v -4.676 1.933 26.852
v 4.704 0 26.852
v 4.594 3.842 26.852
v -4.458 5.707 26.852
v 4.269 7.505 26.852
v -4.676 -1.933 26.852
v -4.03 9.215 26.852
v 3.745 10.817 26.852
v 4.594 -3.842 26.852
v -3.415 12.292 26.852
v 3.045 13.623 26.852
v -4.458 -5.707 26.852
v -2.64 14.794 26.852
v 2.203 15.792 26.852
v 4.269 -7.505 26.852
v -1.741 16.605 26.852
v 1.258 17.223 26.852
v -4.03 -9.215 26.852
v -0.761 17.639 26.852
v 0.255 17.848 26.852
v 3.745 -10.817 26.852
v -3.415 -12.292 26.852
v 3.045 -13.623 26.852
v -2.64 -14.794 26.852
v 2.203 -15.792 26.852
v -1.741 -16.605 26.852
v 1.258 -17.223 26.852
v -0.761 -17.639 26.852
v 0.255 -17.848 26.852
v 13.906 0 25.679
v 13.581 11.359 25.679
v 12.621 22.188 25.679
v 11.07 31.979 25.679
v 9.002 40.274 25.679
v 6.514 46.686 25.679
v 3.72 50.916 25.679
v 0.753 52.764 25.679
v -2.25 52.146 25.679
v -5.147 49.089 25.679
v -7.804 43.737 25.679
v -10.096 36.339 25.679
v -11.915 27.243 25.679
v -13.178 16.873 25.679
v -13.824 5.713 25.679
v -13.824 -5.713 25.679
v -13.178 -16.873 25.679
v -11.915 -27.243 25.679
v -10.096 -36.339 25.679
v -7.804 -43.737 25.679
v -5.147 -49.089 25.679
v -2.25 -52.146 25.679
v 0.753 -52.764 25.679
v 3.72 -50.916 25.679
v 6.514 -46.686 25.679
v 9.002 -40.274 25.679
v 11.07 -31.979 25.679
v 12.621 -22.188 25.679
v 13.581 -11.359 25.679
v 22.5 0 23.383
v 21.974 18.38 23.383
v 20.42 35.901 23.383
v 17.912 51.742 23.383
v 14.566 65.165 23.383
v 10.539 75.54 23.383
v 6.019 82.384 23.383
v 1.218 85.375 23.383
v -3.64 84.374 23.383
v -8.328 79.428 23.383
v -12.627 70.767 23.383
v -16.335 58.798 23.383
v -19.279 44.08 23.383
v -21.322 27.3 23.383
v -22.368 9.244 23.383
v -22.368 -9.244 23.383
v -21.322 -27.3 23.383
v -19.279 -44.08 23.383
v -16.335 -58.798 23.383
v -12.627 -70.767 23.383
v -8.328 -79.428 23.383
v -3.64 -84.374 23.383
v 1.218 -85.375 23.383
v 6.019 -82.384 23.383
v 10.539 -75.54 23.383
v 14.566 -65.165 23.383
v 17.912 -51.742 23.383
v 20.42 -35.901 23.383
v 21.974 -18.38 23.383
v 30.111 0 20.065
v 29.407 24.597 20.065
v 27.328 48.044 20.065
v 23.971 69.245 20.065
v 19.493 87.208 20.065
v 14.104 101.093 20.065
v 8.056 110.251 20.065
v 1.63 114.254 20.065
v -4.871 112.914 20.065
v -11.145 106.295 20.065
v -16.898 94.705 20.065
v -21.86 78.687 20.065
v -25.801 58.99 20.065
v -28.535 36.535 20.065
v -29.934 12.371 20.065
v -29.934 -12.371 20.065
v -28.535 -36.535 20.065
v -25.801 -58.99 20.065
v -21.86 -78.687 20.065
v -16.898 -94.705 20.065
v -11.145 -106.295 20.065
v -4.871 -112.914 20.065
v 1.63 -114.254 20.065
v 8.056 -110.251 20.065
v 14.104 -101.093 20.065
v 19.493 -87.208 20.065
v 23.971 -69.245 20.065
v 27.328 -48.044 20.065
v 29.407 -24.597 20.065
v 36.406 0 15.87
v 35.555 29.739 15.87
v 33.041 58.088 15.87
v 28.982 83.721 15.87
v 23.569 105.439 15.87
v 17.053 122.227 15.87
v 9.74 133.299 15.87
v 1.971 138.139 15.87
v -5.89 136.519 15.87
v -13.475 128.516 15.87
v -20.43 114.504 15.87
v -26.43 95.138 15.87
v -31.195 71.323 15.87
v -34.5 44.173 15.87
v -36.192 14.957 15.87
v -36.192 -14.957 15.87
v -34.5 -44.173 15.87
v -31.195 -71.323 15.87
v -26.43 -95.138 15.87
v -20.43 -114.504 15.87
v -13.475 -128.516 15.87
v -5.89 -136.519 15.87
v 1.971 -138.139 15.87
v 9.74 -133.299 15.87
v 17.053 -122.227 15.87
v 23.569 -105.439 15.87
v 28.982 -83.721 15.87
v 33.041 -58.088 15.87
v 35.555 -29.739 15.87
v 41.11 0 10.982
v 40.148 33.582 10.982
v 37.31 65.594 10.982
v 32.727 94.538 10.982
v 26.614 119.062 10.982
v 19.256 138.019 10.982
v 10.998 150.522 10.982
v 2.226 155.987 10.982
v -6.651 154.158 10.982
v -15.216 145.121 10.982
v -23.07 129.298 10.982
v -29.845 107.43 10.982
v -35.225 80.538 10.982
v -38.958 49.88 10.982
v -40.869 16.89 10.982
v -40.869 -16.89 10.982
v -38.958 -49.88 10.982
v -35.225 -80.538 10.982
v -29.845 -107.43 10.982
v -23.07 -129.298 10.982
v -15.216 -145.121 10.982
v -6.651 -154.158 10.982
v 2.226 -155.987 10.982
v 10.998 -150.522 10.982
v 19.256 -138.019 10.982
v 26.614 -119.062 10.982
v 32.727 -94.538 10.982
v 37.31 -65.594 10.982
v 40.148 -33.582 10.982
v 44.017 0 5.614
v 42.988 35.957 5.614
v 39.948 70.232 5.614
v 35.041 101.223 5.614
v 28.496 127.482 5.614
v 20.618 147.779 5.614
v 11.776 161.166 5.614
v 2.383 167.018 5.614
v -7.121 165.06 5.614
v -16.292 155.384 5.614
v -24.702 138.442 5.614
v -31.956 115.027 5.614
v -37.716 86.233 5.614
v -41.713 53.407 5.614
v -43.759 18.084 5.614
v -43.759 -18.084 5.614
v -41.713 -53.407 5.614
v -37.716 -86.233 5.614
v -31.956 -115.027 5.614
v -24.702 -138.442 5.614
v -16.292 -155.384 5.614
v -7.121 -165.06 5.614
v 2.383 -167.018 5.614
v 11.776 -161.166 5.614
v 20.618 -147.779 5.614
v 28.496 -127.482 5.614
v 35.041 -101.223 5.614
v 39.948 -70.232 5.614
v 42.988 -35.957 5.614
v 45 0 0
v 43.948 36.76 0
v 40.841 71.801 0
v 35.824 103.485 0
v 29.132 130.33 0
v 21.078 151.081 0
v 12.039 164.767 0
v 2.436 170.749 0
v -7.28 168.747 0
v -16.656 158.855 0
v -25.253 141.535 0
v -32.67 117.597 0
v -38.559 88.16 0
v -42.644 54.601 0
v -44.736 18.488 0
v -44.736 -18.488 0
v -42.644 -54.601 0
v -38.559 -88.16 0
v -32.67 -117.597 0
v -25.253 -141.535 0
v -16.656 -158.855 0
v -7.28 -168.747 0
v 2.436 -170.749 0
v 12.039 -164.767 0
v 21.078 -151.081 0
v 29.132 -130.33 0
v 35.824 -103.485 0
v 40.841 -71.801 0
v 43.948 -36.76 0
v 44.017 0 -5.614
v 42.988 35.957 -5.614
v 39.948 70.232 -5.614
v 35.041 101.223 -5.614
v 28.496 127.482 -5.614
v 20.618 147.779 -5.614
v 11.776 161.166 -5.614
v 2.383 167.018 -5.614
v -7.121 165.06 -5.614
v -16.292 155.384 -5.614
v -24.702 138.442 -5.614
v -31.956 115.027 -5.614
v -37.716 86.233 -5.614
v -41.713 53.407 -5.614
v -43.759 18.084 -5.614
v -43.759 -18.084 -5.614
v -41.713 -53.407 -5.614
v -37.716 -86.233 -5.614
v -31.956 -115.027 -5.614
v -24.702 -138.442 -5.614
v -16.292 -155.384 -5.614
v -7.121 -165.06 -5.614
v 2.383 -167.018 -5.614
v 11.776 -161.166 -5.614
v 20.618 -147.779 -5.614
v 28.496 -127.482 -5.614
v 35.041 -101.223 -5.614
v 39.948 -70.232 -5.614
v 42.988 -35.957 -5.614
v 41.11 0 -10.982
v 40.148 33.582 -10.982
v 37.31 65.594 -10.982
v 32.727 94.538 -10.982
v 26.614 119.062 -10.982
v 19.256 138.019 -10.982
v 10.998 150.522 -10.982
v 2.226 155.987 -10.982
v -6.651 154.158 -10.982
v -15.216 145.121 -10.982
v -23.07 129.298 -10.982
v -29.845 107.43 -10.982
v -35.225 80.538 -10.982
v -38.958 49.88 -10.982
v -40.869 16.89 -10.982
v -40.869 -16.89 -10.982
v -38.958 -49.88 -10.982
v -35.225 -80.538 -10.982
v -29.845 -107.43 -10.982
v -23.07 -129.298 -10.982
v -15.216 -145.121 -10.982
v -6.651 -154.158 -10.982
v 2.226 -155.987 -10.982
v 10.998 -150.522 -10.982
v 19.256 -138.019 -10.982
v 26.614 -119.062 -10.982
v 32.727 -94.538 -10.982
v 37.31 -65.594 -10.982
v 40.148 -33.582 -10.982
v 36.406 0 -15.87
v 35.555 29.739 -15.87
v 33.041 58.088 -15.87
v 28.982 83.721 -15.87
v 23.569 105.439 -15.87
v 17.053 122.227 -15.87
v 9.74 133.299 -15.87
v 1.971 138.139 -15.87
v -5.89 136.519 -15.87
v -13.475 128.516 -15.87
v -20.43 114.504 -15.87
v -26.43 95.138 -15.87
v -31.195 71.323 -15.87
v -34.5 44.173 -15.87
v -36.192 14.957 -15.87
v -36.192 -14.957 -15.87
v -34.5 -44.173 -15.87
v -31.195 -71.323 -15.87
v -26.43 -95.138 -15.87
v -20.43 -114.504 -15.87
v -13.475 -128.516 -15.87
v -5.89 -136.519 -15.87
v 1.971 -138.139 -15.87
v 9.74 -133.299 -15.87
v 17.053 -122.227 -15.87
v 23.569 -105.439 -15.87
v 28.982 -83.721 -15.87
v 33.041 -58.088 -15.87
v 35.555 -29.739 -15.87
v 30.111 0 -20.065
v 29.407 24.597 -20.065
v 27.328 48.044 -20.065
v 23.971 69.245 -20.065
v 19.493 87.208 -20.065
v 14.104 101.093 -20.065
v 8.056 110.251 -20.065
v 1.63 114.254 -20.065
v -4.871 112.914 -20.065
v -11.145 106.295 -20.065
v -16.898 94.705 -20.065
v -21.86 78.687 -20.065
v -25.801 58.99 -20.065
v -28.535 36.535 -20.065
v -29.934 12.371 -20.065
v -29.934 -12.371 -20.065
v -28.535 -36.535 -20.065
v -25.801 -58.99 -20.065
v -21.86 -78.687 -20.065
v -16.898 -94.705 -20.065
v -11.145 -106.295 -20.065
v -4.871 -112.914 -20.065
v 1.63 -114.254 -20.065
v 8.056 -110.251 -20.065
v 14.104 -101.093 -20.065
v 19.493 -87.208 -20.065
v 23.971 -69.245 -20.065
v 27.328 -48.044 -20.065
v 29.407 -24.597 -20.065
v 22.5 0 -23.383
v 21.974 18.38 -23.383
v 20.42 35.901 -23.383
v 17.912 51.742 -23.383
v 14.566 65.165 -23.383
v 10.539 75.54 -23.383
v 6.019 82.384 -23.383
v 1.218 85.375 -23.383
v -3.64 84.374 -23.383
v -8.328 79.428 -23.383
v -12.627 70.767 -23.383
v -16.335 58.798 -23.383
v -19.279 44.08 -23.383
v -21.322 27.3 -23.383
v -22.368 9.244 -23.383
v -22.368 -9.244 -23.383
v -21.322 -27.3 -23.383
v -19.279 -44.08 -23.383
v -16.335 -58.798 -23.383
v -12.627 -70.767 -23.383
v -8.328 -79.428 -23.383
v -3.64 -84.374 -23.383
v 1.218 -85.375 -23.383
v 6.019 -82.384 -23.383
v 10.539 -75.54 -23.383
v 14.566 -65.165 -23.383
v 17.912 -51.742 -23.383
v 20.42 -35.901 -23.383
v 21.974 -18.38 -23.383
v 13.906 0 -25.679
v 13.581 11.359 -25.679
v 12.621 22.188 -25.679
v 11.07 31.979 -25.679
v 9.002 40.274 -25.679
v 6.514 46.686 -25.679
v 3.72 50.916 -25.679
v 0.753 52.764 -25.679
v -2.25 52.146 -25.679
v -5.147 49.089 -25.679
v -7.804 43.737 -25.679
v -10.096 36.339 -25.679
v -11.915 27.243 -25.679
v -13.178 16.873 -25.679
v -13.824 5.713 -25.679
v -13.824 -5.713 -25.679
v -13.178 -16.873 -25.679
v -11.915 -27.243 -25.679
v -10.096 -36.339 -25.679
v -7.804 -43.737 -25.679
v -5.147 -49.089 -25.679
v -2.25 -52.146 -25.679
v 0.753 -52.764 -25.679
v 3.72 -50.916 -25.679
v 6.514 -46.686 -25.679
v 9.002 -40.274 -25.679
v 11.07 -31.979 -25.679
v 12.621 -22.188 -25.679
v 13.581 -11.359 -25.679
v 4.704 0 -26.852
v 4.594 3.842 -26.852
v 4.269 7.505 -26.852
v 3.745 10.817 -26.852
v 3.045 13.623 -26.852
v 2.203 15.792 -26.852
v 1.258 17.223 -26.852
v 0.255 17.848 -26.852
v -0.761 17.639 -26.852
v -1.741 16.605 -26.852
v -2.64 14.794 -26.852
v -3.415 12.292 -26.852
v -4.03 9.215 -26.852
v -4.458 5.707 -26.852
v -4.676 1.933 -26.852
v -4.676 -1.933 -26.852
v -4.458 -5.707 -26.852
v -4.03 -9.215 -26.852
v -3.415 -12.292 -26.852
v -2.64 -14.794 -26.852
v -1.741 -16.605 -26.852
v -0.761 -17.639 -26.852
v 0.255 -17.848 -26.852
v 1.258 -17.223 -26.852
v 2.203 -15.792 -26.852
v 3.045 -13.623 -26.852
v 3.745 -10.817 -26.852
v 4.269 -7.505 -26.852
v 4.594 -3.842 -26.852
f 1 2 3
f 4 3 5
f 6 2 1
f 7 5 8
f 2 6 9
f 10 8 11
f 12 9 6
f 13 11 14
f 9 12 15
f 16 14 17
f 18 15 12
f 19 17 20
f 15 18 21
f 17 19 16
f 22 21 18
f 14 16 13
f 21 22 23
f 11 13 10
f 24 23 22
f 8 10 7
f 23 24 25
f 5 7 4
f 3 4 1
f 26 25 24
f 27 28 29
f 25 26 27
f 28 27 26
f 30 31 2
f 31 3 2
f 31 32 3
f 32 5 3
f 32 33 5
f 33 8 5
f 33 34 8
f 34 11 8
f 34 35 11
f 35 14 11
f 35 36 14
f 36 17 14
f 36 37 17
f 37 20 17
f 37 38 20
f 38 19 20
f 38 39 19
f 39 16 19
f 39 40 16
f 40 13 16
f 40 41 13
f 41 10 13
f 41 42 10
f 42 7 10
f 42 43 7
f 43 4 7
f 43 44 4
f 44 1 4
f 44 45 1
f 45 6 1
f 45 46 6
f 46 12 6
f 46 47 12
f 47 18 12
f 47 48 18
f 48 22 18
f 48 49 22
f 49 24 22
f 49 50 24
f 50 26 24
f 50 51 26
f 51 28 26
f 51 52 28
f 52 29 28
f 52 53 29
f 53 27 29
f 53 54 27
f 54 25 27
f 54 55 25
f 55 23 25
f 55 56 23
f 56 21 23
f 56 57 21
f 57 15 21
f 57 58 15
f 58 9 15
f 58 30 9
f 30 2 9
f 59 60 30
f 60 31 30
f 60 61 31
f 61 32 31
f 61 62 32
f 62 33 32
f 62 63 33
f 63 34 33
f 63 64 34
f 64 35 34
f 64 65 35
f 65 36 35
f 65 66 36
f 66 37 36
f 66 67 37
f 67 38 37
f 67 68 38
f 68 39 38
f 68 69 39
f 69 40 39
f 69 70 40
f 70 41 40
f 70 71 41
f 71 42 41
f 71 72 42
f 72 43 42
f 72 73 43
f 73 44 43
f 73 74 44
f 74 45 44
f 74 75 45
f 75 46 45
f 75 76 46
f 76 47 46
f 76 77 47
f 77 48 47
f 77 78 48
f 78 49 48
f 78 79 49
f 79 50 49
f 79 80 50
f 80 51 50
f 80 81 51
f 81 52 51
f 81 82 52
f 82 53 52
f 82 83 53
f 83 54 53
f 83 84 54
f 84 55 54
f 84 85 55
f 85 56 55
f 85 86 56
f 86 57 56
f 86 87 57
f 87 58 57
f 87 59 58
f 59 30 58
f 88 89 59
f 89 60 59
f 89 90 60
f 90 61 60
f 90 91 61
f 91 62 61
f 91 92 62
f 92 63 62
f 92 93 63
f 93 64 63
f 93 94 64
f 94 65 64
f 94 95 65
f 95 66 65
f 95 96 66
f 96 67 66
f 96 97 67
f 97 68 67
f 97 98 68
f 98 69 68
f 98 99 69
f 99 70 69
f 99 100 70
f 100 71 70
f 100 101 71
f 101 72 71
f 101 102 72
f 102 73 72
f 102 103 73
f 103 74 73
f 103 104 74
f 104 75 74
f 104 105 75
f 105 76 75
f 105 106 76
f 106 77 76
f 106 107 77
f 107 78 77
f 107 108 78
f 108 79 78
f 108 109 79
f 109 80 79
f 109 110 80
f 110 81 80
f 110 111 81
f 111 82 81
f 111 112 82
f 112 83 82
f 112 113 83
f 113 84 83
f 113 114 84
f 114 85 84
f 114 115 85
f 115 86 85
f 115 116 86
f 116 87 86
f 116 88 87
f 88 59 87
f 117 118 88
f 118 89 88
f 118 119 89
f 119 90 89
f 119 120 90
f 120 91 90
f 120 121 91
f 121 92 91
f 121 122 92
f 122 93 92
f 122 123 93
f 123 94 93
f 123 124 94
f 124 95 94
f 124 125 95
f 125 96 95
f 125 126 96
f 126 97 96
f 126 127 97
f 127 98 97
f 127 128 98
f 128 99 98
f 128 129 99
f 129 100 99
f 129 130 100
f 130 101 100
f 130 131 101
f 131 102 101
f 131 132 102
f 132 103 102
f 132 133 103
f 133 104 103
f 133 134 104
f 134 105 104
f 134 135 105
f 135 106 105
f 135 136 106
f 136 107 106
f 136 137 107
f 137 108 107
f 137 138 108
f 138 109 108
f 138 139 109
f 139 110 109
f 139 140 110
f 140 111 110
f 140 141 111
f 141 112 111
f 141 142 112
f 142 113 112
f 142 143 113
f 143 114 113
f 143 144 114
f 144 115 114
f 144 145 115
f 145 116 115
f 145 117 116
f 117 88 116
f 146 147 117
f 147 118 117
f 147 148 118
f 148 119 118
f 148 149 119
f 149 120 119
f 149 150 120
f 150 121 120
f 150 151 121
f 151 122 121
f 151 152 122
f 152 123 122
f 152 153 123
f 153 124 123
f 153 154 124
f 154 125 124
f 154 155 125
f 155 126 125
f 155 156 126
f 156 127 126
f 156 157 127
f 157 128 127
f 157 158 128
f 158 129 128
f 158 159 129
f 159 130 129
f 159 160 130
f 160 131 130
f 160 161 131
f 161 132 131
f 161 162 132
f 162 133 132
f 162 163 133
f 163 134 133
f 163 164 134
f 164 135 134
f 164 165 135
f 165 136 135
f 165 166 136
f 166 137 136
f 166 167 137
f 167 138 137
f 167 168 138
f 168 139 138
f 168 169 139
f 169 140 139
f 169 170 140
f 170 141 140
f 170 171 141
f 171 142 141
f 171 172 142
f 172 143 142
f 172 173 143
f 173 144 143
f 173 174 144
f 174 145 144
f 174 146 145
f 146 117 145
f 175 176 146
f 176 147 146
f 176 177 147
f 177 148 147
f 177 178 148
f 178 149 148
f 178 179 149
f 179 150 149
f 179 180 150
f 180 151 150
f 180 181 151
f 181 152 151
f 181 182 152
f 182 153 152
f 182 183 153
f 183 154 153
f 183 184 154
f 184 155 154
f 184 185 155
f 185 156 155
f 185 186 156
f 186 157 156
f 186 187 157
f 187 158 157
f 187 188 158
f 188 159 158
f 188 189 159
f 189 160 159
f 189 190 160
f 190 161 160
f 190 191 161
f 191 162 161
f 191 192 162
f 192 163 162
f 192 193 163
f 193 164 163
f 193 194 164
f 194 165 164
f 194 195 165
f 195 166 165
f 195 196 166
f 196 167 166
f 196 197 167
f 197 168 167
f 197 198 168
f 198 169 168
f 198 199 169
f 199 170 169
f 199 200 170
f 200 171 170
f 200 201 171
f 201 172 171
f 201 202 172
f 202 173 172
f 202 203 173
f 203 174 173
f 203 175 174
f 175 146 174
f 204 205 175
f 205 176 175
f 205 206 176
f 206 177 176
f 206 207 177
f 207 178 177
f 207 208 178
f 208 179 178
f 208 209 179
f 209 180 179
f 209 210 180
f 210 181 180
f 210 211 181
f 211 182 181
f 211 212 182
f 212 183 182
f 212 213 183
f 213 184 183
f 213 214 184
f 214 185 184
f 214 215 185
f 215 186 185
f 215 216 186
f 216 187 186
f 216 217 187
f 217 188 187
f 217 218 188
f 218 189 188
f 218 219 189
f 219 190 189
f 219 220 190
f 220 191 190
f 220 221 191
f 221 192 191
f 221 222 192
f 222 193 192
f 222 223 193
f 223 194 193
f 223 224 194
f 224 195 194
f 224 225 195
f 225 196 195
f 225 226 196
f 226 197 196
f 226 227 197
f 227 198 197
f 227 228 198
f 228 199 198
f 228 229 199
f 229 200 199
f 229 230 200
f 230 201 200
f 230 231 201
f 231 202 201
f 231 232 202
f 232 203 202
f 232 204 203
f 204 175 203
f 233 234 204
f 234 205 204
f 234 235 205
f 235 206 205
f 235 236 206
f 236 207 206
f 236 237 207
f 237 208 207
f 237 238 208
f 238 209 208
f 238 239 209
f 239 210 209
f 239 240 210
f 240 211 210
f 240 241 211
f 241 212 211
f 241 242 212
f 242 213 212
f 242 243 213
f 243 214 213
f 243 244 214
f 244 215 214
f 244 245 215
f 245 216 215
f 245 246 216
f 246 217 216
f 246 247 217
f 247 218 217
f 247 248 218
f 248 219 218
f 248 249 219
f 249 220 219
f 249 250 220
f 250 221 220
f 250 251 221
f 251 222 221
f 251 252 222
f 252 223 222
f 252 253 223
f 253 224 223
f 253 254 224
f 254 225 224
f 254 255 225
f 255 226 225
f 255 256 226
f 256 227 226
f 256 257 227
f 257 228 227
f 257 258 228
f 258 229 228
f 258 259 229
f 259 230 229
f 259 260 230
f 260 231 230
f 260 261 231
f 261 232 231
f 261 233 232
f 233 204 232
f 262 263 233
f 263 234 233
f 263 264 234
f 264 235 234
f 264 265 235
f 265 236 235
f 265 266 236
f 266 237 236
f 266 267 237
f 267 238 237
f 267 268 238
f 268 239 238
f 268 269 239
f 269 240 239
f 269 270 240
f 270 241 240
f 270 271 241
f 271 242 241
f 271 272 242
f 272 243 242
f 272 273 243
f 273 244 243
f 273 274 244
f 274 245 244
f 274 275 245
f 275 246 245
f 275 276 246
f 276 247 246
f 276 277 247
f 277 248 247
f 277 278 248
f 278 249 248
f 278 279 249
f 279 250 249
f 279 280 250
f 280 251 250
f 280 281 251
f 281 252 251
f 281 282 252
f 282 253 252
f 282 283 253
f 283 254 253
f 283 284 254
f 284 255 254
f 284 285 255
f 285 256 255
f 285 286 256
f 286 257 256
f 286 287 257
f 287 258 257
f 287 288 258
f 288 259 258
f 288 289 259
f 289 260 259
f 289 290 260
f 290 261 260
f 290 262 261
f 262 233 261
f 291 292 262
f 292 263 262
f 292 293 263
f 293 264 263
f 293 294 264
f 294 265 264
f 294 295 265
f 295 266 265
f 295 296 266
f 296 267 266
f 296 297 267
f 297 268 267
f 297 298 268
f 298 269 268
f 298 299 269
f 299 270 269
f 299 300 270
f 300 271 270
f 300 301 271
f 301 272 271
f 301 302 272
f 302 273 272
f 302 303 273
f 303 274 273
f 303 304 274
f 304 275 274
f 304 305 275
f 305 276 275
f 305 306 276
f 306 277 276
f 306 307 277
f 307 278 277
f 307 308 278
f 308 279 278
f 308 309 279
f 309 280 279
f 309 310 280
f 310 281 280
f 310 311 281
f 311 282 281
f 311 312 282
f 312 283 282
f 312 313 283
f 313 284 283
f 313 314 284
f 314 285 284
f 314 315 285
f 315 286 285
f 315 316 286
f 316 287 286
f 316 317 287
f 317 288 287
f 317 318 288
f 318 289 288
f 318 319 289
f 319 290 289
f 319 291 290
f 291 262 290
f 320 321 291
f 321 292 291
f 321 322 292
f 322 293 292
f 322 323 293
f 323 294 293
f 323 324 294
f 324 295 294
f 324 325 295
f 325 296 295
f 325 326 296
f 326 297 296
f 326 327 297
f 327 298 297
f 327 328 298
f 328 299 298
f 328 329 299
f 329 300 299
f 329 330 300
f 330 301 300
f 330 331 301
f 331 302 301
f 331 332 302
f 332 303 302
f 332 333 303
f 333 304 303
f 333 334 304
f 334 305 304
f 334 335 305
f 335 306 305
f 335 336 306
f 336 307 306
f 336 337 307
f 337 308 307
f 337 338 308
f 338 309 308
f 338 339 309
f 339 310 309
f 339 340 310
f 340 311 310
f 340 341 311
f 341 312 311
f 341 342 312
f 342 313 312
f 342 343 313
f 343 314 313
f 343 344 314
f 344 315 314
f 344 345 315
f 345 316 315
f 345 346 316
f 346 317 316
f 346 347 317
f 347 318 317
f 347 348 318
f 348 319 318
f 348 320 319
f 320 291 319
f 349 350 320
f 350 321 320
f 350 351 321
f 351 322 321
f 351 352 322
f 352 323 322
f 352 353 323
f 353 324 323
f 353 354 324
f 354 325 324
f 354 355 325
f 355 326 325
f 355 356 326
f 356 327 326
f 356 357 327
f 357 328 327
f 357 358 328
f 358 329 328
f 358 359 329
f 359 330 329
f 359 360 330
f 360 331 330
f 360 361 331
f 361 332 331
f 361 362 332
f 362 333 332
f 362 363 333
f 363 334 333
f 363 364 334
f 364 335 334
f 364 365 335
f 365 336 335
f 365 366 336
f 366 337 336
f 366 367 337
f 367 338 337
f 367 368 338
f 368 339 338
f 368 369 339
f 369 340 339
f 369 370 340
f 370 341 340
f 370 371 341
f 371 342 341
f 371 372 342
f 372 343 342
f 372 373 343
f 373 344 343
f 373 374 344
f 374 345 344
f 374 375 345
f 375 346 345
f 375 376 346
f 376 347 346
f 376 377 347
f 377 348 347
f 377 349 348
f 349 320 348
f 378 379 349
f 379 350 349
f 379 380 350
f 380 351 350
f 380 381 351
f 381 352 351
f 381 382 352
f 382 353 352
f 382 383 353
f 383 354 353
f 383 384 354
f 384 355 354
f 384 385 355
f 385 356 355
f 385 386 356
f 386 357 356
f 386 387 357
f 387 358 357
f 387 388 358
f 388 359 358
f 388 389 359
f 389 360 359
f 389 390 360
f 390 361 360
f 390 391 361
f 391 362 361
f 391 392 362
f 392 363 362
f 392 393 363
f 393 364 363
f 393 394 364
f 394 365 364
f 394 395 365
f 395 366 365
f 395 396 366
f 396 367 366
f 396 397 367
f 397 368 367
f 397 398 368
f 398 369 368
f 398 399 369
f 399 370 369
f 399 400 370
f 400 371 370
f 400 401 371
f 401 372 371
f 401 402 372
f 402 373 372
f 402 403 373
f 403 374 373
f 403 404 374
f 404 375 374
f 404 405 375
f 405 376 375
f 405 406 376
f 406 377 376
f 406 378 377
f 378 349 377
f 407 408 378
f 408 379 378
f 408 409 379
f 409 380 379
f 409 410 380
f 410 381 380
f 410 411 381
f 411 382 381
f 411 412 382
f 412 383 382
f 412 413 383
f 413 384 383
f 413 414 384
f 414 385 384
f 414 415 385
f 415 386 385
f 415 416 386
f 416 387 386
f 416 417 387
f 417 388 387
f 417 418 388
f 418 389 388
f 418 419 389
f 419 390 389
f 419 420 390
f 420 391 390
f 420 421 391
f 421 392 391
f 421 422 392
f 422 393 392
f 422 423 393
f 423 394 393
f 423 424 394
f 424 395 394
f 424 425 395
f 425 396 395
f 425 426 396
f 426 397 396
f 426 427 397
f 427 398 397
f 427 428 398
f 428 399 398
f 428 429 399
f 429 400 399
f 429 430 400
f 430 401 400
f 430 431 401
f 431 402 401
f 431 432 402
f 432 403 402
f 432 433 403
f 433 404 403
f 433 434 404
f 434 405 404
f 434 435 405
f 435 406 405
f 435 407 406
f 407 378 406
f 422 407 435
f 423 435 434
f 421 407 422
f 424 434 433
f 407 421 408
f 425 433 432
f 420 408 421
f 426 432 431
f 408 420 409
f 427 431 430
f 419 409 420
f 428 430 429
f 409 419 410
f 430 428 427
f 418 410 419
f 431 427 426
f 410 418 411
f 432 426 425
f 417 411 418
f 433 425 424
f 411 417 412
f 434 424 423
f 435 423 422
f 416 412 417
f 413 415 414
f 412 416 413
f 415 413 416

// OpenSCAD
// Generated by SolidPython 1.0.1 on 2020-07-29 00:46:47


scale(v = [5, 19, 3]) {
	sphere(r = 9);
}
/***********************************************
*********      SolidPython code:      **********
************************************************
 
# import packages: SolidPython
from solid import *
from solid.utils import *
from itertools import chain, combinations, permutations


class Resize:

    def __init__(self, scad_file):
        self.scad_file = scad_file
        #self.scad_file = import_scad(scad_file)
        # cone/cylinder param:
        self.r1 = 0
        self.r2 = 0
        self.h = 0
        # rectangular prism param:
        self.w = 0
        self.l = 0
        # ellipse param:
        self.r = 0

    # import OpenScad code (file name corresponds to shape)


    # classify shape + parameters
    def assign(self, param1, param2, param3):
        if self.scad_file == 'cone.scad':
            self.r1 = param1
            self.r2 = param2
            self.h = param3
        elif self.scad_file == 'cylinder.scad':
            self.r1 = param1
            self.r2 = param2
            self.h = param3
        elif self.scad_file == 'rectangularPrism.scad':
            self.h = param1
            self.l = param2
            self.w = param3
        else:
            self.r = param1
            self.h = param2

    # resize parameters
    def iterate(self):
        x = range(3, 20, 2)
        i = 1
        if self.scad_file == 'cone.scad':
            tempList = list(permutations(x, 2))
            for temp in tempList:
                param1 = temp[0]
                param2 = temp[1]
                filepath = 'produced_scad_files/' + 'cone' + str(param1) + '_' + str(param2) + '_' + '.scad'
                scad_render_to_file(cylinder(h=param1, r1=param2, r2=0), filepath)

        elif self.scad_file == 'cylinder.scad':
            tempList = list(permutations(x, 3))
            for temp in tempList:
                param1 = temp[0]
                param2 = temp[1]
                filepath = 'produced_scad_files/' + 'cylinder' + str(param1) + '_' + str(param2) + '_' + '.scad'
                scad_render_to_file(cylinder(h=param1, r1=param2, r2=param2), filepath)

        elif self.scad_file == 'rectangularPrism.scad':
            tempList = list(permutations(x, 3))
            for temp in tempList:
                param1 = temp[0]
                param2 = temp[1]
                param3 = temp[2]
                filepath = 'produced_scad_files/' + 'rectangularPrism' + str(param1) + '_' + str(param2) + '_' + str(
                    param3) + '.scad'
                scad_render_to_file(cube(size=(param1, param2, param3)), filepath)

        elif self.scad_file == 'ellipse.scad':
            tempList = list(permutations(x, 4))
            for temp in tempList:
                param1 = temp[0]
                param2 = temp[1]
                param3 = temp[2]
                param4 = temp[3]
                filepath = 'produced_scad_files/' + 'ellipse' + str(param1) + '_' + str(param2) + '_' + str(param3) + '_' + str(param4) + '.scad'
                scad_render_to_file(scale([param1, param2, param3])(sphere(r=param4)), filepath)

    def render_to_scadfile(self):
        scad_render_to_file(scad, 'example.scad') 
 
************************************************/
